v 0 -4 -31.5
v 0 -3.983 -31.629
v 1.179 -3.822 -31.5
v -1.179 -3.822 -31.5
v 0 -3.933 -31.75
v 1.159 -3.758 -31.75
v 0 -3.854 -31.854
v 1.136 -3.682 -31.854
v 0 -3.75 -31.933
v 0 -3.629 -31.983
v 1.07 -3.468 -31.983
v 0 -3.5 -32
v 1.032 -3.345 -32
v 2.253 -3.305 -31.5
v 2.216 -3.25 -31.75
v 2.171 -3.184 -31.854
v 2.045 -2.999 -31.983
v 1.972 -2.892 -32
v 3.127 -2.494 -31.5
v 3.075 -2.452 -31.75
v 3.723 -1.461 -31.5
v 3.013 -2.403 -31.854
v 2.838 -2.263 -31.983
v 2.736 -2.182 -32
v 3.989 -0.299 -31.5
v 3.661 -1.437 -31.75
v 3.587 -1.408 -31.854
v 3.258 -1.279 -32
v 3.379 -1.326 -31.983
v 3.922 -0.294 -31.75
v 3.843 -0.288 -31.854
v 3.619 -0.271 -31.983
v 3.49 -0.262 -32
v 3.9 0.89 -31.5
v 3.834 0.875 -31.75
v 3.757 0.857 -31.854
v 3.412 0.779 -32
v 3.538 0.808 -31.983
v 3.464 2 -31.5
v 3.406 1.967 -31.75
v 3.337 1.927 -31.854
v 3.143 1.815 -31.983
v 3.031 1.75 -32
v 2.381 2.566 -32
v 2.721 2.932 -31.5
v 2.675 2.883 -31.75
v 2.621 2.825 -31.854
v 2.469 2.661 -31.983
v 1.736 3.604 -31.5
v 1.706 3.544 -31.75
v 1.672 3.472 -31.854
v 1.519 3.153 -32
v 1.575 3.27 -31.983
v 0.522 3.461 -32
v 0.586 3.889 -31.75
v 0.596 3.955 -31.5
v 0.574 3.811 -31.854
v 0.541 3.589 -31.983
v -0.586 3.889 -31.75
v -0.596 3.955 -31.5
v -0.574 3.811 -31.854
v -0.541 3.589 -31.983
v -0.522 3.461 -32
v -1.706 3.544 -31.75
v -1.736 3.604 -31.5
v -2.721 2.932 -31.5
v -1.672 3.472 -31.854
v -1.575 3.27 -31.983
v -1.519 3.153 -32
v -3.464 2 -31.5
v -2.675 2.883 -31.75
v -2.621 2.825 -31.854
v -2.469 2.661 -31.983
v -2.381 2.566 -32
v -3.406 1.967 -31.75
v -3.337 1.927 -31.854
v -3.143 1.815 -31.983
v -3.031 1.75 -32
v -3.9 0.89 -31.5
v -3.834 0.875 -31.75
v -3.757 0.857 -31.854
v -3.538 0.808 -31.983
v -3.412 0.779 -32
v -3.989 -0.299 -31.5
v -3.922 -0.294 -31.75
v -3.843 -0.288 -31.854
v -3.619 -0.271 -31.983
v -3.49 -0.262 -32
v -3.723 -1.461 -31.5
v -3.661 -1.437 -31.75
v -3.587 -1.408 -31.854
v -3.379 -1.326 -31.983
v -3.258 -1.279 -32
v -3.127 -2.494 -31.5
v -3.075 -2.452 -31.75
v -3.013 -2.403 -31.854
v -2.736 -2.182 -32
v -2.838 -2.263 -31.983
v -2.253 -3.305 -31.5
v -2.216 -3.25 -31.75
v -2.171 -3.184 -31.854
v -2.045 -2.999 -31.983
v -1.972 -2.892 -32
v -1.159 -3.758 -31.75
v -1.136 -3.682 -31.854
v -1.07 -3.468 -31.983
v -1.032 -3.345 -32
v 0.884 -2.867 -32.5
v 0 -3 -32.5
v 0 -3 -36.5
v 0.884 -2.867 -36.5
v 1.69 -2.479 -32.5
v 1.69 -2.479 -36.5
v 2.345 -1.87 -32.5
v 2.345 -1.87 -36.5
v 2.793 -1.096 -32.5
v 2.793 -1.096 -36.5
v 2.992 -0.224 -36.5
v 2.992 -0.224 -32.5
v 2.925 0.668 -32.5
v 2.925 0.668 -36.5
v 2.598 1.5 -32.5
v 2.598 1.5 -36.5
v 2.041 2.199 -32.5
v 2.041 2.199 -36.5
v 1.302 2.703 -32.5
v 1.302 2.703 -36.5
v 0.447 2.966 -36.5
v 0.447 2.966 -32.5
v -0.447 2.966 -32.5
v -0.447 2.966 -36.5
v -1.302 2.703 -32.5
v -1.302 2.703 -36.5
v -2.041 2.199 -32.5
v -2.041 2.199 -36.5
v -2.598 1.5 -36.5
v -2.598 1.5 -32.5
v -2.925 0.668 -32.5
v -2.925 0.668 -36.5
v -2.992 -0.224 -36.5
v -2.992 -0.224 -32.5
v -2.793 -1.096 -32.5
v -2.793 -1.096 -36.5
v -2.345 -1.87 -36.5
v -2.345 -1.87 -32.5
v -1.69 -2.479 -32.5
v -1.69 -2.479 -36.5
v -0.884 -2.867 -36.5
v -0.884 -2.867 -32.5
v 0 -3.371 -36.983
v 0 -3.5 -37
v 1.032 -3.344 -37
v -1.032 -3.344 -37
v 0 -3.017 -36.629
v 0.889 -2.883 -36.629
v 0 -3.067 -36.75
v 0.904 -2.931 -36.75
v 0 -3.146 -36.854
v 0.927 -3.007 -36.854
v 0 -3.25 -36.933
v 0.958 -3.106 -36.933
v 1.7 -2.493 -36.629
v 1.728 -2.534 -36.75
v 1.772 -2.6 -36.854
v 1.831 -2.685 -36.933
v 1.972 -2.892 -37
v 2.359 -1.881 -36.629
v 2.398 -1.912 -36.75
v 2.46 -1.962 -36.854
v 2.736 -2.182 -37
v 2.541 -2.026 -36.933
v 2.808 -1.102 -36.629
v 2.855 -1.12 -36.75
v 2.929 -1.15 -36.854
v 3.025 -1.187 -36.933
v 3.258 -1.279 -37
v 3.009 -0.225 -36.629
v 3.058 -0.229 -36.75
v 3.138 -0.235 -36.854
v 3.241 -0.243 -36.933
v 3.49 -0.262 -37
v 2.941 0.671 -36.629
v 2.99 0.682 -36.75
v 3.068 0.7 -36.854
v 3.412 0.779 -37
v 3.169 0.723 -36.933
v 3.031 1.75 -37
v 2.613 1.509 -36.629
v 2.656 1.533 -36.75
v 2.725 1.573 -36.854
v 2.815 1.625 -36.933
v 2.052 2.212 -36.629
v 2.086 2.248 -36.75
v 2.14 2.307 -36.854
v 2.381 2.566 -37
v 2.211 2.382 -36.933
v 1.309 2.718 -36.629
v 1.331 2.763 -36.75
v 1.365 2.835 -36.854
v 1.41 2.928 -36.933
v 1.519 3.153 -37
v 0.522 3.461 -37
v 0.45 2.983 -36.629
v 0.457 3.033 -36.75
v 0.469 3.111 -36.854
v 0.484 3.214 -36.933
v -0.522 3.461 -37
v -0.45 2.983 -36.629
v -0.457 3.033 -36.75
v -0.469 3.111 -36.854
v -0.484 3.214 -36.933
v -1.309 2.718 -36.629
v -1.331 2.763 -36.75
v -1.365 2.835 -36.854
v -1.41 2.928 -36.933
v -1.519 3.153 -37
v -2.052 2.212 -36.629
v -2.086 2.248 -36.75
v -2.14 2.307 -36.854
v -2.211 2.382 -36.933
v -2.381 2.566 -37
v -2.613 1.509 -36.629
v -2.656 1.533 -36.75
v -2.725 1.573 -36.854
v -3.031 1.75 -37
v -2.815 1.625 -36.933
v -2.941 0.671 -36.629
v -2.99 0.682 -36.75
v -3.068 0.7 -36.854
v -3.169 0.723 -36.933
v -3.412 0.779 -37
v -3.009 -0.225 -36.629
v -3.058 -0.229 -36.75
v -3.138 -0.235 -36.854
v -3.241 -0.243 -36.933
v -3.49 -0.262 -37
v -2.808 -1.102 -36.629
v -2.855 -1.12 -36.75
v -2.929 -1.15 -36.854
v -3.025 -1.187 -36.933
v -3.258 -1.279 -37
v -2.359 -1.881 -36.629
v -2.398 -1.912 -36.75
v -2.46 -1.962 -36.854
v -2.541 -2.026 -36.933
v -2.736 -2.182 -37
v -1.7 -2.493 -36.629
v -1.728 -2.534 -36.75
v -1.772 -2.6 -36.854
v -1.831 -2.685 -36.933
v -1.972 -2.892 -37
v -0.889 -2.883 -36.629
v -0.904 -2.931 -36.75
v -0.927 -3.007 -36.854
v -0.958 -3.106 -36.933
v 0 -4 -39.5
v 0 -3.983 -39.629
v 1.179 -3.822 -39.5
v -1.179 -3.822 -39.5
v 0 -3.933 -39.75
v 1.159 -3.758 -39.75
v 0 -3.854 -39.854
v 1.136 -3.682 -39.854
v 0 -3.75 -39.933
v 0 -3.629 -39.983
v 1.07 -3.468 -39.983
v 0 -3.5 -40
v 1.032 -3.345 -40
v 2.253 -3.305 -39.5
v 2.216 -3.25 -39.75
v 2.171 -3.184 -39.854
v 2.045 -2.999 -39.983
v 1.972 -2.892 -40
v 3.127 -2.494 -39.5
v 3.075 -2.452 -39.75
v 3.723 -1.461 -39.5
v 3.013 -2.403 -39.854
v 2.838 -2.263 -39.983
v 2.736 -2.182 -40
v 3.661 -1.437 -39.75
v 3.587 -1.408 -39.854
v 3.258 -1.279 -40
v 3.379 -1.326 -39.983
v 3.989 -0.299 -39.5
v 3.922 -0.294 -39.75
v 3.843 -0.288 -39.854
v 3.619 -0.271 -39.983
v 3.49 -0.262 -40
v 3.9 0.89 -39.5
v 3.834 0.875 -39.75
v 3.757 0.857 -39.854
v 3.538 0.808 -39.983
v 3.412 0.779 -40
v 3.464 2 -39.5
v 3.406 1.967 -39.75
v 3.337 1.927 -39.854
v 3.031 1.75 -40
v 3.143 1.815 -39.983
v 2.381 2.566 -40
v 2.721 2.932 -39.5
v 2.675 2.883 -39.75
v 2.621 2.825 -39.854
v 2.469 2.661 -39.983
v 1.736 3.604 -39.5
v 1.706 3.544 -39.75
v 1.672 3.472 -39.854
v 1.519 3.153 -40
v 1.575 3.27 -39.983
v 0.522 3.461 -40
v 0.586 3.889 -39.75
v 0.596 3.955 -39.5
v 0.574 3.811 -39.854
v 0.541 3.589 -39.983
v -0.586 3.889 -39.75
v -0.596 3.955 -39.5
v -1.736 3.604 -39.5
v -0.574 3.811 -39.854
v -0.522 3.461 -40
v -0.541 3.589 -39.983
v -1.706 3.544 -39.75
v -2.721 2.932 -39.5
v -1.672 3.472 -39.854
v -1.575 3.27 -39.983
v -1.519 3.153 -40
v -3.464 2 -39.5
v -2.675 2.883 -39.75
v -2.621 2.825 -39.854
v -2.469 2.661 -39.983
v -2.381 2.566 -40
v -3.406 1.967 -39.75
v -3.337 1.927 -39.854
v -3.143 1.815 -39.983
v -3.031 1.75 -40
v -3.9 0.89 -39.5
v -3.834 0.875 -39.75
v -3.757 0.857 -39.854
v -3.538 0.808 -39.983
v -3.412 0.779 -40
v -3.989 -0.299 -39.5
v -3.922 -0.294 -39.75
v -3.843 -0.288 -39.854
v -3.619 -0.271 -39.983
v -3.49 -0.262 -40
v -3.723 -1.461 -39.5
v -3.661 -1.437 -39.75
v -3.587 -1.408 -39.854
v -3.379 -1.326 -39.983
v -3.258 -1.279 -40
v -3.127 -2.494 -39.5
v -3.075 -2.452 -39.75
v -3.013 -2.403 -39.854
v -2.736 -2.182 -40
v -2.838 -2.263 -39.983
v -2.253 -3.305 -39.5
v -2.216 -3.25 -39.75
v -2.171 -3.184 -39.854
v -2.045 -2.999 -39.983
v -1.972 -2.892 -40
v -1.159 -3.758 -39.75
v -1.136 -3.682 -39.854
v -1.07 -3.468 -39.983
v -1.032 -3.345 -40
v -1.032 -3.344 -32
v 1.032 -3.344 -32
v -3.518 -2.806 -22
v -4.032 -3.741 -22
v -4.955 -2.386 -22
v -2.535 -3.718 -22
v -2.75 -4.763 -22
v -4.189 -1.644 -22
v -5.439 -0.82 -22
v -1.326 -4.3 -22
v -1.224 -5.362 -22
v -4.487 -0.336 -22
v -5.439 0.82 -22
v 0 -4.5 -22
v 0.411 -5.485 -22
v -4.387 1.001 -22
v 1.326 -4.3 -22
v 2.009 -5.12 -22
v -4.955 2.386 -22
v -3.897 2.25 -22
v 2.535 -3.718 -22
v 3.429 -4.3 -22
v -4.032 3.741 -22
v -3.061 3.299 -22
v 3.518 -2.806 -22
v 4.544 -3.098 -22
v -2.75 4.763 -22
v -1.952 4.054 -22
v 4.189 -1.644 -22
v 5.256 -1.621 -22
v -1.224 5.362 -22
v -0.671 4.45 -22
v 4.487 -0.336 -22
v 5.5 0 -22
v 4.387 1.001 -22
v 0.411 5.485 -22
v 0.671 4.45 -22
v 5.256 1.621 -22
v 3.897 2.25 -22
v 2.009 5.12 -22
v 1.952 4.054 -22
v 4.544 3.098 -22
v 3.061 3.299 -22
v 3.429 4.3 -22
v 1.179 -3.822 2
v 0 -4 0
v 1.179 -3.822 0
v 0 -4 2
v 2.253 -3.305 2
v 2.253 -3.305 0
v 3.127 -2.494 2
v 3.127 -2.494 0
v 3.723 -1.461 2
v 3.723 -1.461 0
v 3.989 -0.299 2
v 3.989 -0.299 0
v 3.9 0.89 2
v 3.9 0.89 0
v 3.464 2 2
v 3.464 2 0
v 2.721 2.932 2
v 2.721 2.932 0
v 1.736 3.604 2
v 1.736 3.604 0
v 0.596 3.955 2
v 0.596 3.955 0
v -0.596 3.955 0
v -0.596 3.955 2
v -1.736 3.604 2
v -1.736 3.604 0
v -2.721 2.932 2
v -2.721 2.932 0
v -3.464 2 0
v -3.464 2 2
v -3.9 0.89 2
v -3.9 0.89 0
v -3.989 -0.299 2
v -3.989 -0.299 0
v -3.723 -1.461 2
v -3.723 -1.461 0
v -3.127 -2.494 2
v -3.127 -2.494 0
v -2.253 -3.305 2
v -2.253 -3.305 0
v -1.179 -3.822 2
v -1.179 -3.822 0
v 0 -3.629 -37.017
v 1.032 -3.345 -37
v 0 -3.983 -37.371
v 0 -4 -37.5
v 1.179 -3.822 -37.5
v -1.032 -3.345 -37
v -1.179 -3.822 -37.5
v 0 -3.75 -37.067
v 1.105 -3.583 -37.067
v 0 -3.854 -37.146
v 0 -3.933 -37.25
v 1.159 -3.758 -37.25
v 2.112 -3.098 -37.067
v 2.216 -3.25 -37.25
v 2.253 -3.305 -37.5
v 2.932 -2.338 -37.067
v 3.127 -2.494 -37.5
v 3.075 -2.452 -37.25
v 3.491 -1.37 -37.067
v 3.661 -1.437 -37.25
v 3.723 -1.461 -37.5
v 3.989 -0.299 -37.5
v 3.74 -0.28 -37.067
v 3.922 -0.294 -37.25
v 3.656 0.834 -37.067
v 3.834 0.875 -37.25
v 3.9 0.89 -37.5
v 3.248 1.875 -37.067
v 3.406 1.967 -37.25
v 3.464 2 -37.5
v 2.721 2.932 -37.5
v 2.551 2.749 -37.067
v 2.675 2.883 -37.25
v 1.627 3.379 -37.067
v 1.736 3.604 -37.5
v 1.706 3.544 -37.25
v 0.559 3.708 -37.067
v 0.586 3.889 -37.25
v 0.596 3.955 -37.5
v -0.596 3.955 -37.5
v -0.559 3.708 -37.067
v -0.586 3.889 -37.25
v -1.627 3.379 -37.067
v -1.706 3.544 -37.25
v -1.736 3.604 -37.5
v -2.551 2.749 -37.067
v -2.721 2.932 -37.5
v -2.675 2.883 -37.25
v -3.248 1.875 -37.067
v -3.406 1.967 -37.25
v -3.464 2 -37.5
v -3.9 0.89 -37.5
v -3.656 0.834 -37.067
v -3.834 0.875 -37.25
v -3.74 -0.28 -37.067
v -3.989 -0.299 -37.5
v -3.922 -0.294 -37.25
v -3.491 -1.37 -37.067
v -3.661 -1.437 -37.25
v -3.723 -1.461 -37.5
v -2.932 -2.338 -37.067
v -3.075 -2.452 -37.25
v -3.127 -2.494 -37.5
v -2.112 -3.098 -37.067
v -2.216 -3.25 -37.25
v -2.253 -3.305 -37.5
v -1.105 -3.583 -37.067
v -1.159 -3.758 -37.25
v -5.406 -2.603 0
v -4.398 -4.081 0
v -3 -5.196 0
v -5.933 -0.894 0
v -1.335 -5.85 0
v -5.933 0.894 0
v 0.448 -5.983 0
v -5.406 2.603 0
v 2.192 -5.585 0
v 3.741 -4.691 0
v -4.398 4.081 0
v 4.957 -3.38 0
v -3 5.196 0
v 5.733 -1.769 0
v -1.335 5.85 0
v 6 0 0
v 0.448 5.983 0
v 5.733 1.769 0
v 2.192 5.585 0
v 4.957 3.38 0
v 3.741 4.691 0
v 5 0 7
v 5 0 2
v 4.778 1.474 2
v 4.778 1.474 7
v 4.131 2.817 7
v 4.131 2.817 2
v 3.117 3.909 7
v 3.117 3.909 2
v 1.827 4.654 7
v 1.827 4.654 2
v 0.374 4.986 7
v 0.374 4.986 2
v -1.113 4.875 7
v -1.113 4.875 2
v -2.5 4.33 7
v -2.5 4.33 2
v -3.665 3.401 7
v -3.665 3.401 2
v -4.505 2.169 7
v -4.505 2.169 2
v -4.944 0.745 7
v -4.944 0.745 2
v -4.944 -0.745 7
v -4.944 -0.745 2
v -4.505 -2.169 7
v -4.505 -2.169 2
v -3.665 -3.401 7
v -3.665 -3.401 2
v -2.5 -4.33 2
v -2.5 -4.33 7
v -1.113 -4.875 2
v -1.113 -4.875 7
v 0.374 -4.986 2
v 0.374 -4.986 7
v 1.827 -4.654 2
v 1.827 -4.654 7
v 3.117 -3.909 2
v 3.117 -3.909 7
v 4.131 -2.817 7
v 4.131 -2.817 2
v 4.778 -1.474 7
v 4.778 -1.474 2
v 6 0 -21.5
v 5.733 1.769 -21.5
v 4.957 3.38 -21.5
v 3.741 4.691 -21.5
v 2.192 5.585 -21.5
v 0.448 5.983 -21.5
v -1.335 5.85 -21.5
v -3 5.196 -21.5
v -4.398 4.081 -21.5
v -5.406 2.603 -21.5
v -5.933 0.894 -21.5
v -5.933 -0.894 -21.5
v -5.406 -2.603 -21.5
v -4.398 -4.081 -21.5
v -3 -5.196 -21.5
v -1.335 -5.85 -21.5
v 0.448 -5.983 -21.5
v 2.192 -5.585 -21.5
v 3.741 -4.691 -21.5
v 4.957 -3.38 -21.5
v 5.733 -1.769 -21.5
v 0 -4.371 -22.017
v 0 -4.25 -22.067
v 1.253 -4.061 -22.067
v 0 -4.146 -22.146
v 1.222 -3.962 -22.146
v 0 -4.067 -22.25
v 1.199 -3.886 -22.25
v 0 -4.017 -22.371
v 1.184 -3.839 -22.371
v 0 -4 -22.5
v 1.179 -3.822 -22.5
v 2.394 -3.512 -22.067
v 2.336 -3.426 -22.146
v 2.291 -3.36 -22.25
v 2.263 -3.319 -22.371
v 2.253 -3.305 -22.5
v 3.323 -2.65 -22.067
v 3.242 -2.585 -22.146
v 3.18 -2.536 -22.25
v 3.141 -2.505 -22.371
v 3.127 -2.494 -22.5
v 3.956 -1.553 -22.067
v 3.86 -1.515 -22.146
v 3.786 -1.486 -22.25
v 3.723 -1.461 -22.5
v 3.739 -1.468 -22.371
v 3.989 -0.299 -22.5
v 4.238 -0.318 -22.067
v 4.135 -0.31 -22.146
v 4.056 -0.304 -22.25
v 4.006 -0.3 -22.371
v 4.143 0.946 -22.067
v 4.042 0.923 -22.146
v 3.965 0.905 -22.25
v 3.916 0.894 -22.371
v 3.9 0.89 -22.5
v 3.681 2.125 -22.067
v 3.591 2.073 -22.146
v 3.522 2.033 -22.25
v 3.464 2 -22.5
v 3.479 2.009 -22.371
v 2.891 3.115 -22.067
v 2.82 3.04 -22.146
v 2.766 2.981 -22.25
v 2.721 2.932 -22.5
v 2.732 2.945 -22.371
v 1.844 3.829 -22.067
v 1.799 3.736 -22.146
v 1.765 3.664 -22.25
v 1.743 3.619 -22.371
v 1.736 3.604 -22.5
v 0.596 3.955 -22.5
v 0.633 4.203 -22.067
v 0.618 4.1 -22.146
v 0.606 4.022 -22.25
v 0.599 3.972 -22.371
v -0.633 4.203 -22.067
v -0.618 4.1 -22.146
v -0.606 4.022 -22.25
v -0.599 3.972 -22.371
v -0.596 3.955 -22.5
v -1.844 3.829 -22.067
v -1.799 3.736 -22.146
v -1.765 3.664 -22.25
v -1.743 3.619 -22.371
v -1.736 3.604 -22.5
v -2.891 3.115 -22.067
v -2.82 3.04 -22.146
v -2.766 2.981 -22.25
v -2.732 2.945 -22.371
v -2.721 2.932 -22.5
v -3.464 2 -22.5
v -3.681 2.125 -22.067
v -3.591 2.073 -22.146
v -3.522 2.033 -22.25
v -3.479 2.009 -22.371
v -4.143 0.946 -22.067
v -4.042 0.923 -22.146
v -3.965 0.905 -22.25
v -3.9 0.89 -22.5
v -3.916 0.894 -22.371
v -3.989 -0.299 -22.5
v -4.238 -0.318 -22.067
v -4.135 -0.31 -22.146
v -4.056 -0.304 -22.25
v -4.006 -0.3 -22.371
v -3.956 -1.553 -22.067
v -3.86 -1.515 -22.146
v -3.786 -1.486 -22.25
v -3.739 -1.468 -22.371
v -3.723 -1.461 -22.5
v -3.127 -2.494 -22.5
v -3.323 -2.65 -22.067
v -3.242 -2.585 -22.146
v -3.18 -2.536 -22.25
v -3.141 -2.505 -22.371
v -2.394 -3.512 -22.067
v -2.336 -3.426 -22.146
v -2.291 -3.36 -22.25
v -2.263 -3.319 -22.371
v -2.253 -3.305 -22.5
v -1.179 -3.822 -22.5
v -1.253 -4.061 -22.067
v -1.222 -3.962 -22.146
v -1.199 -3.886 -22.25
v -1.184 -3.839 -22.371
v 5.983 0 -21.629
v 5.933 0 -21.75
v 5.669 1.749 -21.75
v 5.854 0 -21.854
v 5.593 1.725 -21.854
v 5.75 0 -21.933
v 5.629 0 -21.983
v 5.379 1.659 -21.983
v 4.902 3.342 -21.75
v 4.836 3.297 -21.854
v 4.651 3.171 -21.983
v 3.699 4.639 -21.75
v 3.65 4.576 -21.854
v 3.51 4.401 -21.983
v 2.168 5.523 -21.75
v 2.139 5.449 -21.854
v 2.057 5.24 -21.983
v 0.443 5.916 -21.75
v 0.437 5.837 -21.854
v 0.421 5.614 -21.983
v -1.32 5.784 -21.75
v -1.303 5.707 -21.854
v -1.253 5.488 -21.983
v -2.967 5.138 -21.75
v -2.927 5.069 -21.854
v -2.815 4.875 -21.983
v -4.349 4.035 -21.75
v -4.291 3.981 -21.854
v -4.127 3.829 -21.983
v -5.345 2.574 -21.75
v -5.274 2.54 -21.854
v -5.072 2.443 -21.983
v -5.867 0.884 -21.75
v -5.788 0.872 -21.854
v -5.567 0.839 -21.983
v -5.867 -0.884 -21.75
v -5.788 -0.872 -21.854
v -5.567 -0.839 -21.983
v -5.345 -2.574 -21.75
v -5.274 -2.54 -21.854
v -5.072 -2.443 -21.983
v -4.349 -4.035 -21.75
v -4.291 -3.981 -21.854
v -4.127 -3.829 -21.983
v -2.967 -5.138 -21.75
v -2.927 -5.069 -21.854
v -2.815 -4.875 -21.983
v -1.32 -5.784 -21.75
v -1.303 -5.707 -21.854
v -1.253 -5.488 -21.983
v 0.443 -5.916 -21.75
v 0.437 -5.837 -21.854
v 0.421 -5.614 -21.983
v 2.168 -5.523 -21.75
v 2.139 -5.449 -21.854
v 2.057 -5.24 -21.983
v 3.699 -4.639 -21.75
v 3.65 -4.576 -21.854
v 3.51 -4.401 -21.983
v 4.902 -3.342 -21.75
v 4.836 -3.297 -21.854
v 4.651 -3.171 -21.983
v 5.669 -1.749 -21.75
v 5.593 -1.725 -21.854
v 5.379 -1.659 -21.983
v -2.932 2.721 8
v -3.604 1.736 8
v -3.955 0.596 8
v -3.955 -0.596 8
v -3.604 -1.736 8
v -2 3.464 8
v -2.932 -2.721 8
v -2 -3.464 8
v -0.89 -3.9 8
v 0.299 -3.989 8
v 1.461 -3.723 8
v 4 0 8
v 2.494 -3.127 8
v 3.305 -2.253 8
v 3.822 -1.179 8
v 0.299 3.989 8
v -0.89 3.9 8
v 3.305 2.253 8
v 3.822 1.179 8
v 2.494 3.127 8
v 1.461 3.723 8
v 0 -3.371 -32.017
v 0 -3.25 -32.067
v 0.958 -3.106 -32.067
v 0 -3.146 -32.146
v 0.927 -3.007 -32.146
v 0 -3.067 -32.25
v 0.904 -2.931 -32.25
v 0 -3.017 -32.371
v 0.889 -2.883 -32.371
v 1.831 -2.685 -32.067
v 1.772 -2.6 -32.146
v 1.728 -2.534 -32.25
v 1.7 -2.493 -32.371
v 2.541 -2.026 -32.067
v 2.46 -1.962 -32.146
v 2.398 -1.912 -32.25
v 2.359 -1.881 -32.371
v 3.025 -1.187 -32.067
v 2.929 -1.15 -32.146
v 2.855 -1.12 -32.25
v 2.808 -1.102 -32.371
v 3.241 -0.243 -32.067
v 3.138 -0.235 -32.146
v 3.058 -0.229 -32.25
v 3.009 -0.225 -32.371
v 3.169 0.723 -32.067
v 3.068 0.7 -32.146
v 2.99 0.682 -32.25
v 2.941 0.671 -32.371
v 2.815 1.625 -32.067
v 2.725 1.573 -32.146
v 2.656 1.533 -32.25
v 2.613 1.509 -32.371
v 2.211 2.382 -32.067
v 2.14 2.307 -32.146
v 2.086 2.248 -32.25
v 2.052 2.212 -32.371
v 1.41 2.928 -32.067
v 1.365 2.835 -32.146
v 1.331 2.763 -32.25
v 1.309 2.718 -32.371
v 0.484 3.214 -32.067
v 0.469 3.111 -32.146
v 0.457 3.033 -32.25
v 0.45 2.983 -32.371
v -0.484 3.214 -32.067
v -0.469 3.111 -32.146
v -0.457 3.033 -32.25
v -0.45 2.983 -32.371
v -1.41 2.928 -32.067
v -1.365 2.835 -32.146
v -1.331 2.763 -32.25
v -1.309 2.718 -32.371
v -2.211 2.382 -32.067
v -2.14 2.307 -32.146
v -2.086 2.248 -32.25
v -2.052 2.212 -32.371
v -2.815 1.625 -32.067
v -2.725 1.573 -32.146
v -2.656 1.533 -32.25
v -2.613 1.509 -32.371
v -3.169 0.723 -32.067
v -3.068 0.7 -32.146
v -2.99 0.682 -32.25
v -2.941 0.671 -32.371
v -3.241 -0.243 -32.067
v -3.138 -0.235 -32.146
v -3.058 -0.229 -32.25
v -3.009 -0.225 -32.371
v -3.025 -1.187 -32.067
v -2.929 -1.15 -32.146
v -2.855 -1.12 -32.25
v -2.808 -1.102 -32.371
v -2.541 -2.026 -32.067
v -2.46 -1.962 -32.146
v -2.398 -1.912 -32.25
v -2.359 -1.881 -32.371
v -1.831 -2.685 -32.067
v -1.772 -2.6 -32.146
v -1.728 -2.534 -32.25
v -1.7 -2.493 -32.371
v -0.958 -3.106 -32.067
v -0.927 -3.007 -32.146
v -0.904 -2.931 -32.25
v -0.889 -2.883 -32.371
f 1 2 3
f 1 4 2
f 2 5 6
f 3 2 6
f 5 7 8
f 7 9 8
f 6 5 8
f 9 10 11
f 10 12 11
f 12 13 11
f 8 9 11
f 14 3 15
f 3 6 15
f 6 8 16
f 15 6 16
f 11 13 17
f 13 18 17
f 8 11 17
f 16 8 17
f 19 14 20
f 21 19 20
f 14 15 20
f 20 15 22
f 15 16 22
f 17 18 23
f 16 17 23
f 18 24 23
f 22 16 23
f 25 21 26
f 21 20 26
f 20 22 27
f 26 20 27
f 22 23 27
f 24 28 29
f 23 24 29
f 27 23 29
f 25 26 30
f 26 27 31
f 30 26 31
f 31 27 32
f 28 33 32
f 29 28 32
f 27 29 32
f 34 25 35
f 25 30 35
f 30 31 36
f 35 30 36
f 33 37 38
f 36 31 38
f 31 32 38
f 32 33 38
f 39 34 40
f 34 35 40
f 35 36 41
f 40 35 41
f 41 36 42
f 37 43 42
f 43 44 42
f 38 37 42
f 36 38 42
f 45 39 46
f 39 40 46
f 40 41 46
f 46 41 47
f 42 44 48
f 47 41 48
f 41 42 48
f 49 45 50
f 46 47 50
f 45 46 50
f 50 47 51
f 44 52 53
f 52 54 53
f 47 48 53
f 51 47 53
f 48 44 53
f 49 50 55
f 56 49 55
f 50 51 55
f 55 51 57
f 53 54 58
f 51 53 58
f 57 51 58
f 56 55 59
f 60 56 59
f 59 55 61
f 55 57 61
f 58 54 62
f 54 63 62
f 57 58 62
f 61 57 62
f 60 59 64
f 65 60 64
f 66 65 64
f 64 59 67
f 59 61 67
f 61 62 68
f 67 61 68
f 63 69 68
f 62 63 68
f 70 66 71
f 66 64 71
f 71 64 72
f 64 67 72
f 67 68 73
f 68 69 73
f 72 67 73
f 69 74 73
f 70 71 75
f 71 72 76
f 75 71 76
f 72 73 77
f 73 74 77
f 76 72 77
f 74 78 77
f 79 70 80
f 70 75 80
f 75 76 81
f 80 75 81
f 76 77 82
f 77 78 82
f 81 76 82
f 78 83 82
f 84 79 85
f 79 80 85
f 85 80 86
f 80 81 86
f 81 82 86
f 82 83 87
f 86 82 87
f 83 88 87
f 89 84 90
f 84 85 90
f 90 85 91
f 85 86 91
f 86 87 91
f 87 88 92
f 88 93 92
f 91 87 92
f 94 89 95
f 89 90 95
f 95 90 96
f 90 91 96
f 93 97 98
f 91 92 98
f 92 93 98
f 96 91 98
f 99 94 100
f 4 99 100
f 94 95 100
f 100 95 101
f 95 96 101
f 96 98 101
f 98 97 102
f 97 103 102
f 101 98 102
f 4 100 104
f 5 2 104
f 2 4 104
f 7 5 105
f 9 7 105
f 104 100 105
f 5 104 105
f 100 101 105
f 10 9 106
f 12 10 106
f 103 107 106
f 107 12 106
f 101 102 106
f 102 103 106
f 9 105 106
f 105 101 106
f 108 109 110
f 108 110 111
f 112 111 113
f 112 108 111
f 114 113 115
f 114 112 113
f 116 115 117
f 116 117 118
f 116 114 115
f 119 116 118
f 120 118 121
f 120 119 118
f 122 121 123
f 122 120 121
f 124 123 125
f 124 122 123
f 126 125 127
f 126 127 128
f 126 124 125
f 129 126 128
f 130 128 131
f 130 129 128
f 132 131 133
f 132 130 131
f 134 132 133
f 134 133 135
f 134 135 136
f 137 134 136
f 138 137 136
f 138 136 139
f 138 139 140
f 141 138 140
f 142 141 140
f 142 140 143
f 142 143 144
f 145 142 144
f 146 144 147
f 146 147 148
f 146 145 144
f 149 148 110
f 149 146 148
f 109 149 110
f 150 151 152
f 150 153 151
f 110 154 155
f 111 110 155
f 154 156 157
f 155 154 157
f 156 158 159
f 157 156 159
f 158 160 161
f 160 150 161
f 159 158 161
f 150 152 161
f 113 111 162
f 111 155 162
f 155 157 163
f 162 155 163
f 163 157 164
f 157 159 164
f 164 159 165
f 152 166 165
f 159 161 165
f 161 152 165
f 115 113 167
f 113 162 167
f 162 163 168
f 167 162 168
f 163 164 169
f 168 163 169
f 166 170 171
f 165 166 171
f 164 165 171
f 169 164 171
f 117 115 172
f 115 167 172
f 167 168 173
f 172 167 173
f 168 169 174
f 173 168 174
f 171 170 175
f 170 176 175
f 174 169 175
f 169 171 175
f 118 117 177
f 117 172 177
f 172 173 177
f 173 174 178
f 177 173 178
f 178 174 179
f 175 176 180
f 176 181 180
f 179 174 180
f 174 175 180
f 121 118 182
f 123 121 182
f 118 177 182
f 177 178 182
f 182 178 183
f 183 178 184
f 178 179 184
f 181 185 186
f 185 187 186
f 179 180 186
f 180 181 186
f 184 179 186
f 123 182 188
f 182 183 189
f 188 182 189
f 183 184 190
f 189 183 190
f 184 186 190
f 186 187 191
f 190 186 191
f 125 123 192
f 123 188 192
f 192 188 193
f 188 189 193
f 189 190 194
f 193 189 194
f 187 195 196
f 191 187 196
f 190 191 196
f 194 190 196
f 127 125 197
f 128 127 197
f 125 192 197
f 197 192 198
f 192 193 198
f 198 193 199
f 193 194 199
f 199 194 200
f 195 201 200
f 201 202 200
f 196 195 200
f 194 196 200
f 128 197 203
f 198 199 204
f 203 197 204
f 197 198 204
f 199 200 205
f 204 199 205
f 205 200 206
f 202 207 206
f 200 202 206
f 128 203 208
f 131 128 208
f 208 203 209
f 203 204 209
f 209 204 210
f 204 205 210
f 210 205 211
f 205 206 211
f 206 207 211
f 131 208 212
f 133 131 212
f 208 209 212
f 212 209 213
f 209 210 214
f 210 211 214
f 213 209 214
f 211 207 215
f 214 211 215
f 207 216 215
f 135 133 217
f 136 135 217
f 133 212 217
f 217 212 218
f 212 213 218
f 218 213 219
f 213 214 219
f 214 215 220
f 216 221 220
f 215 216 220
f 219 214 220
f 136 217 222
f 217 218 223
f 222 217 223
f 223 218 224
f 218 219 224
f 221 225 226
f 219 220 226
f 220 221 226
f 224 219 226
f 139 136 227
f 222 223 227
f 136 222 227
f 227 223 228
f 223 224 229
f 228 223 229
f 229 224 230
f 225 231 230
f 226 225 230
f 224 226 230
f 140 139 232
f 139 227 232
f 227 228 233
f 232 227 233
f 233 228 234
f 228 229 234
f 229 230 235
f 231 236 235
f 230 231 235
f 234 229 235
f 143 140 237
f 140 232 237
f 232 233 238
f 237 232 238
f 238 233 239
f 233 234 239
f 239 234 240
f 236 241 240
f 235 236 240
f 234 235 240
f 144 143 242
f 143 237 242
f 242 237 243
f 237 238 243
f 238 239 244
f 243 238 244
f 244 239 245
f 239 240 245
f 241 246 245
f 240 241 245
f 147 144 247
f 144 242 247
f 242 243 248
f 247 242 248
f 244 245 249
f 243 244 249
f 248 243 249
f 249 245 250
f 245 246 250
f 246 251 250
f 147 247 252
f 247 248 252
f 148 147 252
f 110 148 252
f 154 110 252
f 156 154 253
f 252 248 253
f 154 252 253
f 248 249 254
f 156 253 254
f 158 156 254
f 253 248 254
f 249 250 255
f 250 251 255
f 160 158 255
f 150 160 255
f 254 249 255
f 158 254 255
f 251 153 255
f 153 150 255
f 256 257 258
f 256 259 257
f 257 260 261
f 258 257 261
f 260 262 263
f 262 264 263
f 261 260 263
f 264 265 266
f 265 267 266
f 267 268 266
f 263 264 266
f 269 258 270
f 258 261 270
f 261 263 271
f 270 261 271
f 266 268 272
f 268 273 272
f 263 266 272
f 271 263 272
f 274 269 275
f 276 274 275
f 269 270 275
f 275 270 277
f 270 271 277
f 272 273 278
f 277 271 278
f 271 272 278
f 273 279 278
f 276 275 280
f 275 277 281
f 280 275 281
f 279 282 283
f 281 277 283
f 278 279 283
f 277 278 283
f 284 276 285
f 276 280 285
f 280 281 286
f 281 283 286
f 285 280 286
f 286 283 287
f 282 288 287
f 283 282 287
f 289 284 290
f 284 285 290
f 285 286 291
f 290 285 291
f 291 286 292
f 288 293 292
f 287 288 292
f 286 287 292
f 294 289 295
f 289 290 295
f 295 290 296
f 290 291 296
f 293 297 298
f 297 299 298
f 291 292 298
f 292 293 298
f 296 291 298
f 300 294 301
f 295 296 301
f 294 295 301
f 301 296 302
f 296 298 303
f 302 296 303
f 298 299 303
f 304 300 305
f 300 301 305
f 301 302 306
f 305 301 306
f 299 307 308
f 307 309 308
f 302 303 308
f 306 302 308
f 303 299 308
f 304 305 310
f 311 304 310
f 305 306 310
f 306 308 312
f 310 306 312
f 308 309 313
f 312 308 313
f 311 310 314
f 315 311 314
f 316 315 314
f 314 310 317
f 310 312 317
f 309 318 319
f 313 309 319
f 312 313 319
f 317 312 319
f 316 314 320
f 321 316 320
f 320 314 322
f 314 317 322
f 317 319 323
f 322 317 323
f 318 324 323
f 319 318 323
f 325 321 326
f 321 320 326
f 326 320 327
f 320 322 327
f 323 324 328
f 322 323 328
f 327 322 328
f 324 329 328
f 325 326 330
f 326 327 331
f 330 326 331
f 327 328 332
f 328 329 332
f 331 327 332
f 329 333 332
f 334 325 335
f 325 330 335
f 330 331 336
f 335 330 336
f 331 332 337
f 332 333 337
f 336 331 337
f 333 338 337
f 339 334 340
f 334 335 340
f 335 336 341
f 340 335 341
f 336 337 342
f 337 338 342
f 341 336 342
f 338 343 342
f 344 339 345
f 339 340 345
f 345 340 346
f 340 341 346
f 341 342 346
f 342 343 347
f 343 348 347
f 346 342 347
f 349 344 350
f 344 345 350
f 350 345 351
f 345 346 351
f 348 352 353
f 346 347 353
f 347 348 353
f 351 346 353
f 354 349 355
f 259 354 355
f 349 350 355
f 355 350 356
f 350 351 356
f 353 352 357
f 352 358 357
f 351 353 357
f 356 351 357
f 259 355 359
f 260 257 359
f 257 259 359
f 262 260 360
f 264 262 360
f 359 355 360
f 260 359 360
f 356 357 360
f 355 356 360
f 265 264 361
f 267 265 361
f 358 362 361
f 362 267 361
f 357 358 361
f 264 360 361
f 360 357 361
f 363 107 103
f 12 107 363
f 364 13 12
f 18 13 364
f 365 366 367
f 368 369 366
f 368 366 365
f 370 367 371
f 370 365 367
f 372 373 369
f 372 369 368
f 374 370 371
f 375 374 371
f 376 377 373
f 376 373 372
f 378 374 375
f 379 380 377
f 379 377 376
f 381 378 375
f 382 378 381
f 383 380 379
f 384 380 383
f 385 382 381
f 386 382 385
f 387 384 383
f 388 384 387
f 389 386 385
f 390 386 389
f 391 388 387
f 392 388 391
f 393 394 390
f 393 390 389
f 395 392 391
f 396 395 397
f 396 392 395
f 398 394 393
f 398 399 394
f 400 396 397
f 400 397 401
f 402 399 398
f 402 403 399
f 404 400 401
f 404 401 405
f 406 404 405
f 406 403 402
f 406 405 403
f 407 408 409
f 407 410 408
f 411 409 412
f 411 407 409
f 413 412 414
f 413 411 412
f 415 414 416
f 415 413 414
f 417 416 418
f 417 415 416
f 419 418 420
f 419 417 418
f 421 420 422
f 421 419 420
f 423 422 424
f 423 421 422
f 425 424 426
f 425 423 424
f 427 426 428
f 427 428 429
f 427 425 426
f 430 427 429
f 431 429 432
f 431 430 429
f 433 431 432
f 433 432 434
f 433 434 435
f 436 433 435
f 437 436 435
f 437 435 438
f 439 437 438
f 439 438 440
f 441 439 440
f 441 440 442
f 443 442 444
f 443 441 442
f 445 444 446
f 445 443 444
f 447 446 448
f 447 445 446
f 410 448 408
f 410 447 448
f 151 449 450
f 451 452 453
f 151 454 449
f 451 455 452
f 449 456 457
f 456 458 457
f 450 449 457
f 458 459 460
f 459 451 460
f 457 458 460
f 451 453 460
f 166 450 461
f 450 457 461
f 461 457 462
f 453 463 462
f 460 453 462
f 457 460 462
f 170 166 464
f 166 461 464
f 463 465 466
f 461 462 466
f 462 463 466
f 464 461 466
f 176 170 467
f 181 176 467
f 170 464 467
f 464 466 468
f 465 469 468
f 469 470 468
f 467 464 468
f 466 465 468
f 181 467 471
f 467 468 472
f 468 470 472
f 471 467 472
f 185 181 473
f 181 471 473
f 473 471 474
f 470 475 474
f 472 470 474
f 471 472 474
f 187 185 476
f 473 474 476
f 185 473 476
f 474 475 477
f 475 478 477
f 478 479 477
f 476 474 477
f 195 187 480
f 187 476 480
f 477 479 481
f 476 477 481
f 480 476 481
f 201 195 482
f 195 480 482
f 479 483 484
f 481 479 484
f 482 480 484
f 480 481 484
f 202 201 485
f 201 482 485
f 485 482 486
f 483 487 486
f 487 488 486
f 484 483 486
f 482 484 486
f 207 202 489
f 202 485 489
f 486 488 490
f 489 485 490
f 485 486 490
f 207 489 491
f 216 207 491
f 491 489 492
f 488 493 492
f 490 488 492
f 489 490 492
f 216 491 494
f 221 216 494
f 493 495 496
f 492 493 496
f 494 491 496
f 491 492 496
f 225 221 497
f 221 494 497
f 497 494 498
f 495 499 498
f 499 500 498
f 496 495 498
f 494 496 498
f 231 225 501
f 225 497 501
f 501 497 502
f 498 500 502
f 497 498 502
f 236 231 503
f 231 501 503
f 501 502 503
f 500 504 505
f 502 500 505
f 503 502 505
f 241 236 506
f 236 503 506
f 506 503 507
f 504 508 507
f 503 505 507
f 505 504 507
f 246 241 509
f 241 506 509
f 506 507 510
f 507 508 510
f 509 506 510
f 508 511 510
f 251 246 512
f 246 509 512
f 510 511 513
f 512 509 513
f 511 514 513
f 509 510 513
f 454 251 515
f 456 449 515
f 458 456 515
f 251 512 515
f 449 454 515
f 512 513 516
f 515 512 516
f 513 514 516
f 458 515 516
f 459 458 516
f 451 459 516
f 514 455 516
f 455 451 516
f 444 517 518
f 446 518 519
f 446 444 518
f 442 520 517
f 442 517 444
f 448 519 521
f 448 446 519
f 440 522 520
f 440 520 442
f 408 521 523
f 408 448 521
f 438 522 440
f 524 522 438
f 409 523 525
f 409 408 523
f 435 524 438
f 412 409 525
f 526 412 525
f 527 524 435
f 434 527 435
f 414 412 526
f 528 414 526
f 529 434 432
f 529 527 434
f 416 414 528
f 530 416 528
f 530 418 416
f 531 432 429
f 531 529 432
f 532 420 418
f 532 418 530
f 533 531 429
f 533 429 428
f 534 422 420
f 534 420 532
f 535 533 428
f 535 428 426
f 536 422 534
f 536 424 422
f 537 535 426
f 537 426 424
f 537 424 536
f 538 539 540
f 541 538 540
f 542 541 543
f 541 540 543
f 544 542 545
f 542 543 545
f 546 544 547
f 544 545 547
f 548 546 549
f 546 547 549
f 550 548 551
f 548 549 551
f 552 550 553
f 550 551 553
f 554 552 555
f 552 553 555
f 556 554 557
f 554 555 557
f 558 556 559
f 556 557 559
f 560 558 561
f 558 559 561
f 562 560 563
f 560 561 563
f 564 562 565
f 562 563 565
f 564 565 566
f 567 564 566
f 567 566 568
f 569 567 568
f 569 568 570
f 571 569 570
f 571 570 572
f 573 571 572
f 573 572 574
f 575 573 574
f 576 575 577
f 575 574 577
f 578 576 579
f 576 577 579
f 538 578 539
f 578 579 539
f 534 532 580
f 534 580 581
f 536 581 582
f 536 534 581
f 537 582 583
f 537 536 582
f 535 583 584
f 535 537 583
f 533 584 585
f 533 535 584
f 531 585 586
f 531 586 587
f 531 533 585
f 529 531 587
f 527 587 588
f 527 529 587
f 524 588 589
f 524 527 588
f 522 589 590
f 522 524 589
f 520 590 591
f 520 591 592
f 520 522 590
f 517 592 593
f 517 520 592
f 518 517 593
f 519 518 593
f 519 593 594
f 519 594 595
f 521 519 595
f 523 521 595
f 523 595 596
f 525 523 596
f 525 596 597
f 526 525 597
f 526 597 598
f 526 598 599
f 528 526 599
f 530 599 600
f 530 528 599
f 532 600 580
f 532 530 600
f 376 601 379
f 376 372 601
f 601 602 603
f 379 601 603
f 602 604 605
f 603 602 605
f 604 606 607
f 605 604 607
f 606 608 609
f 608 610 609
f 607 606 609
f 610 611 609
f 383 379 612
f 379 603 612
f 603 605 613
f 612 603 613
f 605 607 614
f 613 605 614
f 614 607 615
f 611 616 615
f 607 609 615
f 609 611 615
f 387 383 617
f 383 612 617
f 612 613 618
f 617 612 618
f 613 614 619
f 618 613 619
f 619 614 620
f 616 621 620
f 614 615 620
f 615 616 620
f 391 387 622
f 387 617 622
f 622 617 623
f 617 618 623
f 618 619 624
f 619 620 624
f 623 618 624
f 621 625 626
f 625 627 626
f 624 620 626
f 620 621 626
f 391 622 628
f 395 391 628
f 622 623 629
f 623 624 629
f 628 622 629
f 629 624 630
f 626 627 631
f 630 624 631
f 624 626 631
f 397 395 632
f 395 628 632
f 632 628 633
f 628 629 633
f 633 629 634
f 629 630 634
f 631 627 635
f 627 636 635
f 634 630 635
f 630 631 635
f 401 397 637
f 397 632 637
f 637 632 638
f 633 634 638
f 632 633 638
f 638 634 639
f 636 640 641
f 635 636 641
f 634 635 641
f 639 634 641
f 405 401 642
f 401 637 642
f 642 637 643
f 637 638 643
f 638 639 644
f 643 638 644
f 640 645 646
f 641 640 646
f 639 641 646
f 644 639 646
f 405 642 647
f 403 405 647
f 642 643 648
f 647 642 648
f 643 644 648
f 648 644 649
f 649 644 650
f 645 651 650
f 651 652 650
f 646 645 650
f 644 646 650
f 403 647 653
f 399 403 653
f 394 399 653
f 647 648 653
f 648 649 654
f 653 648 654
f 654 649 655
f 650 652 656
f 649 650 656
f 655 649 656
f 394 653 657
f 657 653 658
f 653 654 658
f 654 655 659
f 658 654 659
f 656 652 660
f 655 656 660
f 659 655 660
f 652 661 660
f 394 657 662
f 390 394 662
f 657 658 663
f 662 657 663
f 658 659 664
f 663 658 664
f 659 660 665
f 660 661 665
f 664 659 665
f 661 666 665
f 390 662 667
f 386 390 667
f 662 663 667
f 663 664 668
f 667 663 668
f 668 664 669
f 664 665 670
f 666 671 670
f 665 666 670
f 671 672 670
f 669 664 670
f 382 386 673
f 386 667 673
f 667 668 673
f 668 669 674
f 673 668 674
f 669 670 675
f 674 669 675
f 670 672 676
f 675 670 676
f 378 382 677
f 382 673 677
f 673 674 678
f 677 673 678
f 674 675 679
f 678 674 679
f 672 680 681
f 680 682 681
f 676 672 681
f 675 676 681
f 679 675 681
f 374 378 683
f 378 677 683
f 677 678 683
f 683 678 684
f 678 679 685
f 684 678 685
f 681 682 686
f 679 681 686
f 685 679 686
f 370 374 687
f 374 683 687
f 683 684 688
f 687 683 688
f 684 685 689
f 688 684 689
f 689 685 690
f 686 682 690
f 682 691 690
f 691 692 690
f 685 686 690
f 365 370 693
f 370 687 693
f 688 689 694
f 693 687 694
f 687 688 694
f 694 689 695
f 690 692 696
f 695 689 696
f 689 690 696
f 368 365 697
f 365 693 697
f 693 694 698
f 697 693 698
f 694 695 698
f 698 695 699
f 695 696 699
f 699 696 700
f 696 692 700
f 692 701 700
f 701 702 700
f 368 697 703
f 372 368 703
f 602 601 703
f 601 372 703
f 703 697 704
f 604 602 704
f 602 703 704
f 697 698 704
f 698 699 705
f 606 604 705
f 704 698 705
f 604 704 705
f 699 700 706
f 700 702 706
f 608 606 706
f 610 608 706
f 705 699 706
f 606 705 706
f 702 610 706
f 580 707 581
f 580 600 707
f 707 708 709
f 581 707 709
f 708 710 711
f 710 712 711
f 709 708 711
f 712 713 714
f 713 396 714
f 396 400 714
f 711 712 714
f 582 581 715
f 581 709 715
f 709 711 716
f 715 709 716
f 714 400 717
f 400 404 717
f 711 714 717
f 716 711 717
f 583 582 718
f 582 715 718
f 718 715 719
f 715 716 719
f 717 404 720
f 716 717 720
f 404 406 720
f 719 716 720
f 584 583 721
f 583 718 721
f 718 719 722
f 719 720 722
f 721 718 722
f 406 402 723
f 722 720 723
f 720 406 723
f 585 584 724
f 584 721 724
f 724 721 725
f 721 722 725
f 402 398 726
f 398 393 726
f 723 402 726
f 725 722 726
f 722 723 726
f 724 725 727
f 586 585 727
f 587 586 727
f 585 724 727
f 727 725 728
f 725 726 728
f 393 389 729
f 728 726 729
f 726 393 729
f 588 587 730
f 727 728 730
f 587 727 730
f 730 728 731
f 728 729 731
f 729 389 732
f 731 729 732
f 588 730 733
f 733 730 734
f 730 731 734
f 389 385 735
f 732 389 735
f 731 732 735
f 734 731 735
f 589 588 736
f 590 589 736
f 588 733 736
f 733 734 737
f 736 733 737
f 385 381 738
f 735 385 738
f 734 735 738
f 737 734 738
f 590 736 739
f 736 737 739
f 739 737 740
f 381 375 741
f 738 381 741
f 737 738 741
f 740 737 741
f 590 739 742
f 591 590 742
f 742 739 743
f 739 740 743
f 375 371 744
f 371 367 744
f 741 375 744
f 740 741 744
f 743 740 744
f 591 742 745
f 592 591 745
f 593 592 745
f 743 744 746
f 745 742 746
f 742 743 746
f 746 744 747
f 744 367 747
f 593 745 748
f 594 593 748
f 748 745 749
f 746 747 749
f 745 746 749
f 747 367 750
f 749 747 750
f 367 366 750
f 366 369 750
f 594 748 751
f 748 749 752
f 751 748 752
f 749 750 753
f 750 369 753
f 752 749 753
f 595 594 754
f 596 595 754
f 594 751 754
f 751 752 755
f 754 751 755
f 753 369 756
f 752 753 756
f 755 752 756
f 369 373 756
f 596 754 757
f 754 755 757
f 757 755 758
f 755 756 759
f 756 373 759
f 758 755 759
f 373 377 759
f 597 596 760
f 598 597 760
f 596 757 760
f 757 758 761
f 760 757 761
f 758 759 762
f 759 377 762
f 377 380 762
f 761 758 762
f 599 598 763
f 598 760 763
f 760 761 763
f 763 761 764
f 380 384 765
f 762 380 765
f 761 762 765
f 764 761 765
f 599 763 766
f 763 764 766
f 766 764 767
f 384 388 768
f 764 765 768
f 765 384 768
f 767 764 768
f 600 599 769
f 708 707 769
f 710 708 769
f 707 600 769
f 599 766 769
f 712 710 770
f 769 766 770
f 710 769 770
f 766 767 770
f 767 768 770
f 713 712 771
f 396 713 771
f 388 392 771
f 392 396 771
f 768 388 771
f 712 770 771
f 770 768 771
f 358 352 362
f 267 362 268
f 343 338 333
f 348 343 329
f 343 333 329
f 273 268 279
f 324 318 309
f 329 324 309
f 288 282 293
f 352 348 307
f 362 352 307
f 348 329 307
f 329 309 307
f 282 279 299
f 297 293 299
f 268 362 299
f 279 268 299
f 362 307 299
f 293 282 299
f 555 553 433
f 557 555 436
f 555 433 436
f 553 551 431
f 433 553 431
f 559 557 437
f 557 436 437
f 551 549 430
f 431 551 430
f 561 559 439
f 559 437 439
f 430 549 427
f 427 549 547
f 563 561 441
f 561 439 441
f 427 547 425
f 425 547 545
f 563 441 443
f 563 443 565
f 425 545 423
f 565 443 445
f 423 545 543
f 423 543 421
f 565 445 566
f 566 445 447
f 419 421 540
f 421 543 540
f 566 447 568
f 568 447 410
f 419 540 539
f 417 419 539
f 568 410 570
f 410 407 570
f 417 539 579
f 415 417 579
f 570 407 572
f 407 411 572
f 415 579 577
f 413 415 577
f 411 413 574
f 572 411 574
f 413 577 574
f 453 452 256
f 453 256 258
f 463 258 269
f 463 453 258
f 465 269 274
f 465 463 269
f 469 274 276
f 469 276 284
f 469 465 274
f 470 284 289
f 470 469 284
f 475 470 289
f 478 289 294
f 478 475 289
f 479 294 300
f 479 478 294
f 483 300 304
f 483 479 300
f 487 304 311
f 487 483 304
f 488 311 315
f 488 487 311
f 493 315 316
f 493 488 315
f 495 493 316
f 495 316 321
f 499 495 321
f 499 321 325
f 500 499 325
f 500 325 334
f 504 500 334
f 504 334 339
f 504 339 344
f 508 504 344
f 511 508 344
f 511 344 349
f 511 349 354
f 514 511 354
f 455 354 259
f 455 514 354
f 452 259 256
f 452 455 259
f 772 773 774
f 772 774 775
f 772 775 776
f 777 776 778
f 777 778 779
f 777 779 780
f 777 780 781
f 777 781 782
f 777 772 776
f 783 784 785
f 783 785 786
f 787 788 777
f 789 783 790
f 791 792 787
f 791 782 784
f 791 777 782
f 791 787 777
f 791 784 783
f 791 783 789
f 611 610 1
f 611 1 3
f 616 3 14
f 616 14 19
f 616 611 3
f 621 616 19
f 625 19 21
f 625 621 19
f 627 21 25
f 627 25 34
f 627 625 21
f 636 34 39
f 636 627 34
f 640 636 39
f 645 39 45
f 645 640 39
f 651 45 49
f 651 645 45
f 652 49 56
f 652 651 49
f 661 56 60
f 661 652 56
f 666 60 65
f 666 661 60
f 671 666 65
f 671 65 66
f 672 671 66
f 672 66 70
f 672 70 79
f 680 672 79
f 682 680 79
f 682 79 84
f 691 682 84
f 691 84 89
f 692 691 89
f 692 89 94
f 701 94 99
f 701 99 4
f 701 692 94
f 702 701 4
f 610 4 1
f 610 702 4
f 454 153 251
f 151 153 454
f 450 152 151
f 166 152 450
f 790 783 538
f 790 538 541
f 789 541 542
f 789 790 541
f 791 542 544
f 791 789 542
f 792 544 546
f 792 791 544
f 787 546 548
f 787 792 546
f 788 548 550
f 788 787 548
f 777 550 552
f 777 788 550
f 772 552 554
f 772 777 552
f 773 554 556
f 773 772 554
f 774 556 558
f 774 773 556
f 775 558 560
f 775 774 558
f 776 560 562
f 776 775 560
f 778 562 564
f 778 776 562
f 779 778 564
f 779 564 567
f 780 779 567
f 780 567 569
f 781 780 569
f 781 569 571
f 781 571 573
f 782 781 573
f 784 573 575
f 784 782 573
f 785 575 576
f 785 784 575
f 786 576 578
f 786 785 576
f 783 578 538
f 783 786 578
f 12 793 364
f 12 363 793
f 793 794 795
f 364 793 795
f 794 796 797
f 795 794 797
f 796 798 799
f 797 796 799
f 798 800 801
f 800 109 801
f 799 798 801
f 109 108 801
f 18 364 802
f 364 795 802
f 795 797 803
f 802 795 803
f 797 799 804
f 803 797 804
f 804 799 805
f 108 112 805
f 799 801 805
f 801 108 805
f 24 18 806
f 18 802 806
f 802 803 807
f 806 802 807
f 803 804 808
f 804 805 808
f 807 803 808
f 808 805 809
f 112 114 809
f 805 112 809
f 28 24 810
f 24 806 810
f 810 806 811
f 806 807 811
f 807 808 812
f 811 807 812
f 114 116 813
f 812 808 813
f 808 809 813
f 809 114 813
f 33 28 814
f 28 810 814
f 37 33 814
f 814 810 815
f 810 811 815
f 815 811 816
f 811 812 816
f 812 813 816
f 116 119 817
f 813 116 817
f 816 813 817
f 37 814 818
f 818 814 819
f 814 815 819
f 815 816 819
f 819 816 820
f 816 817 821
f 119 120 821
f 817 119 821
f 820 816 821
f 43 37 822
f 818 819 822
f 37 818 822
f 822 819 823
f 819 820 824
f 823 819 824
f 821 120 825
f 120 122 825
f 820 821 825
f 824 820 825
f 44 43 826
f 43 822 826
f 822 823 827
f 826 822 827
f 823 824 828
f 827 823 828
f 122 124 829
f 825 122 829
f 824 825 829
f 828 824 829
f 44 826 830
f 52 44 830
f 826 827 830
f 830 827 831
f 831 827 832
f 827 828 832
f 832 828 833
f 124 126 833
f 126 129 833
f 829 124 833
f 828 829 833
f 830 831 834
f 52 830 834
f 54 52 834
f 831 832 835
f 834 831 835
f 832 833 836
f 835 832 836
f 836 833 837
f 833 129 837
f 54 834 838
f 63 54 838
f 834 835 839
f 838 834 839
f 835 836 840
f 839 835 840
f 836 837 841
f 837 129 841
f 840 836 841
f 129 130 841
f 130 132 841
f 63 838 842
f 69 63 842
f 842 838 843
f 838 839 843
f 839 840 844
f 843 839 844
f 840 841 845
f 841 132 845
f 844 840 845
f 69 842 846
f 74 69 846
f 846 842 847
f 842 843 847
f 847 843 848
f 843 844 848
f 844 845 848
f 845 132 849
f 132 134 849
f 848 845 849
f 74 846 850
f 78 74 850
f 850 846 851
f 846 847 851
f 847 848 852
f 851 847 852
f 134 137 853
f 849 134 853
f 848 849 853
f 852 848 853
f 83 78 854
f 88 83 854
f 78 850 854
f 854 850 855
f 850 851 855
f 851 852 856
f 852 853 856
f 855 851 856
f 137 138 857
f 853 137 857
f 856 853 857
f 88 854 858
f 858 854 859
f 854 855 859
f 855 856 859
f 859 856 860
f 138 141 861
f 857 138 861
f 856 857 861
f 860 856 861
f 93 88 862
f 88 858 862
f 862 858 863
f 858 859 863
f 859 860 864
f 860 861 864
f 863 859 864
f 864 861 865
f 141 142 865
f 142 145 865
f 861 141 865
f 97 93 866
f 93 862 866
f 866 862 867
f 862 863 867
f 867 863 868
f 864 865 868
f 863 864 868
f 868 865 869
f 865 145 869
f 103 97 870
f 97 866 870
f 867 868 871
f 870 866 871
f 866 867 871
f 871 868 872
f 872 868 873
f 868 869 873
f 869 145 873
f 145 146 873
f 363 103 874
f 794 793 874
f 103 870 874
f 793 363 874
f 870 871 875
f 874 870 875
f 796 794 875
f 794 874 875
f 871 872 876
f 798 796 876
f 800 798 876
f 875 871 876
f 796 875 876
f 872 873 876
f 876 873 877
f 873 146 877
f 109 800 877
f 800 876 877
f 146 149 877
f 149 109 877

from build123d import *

# Parameters (mm, degrees)
F0_R     = 6
F1_DEPTH = 40
F2_R     = 5
F3_DEPTH = 8
F6_R     = 0.49999
F7_W     = 1
F7_H     = 2
F9_SIZE  = 1


# Not quite as in the source:
# - a fillet or chamfer is up to 0.001 mm smaller than in the source, because OpenCascade refuses the exact size


with BuildPart() as f1:
    # F0 (on Top) → F1 (new body)
    with BuildSketch(Plane.XY):
        Circle(F0_R)
    extrude(amount=-F1_DEPTH)

    # F2 (on face) → F3 (join)
    with BuildSketch(Plane.XY):
        Circle(F2_R)
    extrude(amount=F3_DEPTH)

    # F4 (on Right) → F5 (revolve, cut)
    with BuildSketch(Plane.YZ):
        Polygon((-6, -22), (-6, -40), (-4, -40), (-4, -37), (-3, -37), (-3, -32), (-4, -32), (-4, -22), align=None)
    revolve(axis=Axis((0, 0, -26.2926705182), (0, 0, 1)), mode=Mode.SUBTRACT)

    # F6 (radius 0.5 in the source; OpenCascade refuses exactly that, so slightly less here)
    f6_edges = [f1.edges().sort_by_distance(p)[0] for p in [
        (0, 4, -40),
        (0, 4, -37),
        (0, 3, -37),
        (0, 3, -32),
        (0, 4, -32),
        (0, 4, -22),
        (-6, 0, -22),
    ]]
    fillet(f6_edges, radius=F6_R)

    # F7 (on Right) → F8 (revolve, cut)
    with BuildSketch(Plane.YZ):
        with Locations((-4.5, 1)):
            Rectangle(F7_W, F7_H)
    revolve(axis=Axis((0, 0, 11.1455004662), (0, 0, 1)), mode=Mode.SUBTRACT)

    # F9
    f9_edges = [f1.edges().sort_by_distance(p)[0] for p in [
        (-5, 0, 8),
    ]]
    chamfer(f9_edges, length=F9_SIZE)


solid = f1.part
